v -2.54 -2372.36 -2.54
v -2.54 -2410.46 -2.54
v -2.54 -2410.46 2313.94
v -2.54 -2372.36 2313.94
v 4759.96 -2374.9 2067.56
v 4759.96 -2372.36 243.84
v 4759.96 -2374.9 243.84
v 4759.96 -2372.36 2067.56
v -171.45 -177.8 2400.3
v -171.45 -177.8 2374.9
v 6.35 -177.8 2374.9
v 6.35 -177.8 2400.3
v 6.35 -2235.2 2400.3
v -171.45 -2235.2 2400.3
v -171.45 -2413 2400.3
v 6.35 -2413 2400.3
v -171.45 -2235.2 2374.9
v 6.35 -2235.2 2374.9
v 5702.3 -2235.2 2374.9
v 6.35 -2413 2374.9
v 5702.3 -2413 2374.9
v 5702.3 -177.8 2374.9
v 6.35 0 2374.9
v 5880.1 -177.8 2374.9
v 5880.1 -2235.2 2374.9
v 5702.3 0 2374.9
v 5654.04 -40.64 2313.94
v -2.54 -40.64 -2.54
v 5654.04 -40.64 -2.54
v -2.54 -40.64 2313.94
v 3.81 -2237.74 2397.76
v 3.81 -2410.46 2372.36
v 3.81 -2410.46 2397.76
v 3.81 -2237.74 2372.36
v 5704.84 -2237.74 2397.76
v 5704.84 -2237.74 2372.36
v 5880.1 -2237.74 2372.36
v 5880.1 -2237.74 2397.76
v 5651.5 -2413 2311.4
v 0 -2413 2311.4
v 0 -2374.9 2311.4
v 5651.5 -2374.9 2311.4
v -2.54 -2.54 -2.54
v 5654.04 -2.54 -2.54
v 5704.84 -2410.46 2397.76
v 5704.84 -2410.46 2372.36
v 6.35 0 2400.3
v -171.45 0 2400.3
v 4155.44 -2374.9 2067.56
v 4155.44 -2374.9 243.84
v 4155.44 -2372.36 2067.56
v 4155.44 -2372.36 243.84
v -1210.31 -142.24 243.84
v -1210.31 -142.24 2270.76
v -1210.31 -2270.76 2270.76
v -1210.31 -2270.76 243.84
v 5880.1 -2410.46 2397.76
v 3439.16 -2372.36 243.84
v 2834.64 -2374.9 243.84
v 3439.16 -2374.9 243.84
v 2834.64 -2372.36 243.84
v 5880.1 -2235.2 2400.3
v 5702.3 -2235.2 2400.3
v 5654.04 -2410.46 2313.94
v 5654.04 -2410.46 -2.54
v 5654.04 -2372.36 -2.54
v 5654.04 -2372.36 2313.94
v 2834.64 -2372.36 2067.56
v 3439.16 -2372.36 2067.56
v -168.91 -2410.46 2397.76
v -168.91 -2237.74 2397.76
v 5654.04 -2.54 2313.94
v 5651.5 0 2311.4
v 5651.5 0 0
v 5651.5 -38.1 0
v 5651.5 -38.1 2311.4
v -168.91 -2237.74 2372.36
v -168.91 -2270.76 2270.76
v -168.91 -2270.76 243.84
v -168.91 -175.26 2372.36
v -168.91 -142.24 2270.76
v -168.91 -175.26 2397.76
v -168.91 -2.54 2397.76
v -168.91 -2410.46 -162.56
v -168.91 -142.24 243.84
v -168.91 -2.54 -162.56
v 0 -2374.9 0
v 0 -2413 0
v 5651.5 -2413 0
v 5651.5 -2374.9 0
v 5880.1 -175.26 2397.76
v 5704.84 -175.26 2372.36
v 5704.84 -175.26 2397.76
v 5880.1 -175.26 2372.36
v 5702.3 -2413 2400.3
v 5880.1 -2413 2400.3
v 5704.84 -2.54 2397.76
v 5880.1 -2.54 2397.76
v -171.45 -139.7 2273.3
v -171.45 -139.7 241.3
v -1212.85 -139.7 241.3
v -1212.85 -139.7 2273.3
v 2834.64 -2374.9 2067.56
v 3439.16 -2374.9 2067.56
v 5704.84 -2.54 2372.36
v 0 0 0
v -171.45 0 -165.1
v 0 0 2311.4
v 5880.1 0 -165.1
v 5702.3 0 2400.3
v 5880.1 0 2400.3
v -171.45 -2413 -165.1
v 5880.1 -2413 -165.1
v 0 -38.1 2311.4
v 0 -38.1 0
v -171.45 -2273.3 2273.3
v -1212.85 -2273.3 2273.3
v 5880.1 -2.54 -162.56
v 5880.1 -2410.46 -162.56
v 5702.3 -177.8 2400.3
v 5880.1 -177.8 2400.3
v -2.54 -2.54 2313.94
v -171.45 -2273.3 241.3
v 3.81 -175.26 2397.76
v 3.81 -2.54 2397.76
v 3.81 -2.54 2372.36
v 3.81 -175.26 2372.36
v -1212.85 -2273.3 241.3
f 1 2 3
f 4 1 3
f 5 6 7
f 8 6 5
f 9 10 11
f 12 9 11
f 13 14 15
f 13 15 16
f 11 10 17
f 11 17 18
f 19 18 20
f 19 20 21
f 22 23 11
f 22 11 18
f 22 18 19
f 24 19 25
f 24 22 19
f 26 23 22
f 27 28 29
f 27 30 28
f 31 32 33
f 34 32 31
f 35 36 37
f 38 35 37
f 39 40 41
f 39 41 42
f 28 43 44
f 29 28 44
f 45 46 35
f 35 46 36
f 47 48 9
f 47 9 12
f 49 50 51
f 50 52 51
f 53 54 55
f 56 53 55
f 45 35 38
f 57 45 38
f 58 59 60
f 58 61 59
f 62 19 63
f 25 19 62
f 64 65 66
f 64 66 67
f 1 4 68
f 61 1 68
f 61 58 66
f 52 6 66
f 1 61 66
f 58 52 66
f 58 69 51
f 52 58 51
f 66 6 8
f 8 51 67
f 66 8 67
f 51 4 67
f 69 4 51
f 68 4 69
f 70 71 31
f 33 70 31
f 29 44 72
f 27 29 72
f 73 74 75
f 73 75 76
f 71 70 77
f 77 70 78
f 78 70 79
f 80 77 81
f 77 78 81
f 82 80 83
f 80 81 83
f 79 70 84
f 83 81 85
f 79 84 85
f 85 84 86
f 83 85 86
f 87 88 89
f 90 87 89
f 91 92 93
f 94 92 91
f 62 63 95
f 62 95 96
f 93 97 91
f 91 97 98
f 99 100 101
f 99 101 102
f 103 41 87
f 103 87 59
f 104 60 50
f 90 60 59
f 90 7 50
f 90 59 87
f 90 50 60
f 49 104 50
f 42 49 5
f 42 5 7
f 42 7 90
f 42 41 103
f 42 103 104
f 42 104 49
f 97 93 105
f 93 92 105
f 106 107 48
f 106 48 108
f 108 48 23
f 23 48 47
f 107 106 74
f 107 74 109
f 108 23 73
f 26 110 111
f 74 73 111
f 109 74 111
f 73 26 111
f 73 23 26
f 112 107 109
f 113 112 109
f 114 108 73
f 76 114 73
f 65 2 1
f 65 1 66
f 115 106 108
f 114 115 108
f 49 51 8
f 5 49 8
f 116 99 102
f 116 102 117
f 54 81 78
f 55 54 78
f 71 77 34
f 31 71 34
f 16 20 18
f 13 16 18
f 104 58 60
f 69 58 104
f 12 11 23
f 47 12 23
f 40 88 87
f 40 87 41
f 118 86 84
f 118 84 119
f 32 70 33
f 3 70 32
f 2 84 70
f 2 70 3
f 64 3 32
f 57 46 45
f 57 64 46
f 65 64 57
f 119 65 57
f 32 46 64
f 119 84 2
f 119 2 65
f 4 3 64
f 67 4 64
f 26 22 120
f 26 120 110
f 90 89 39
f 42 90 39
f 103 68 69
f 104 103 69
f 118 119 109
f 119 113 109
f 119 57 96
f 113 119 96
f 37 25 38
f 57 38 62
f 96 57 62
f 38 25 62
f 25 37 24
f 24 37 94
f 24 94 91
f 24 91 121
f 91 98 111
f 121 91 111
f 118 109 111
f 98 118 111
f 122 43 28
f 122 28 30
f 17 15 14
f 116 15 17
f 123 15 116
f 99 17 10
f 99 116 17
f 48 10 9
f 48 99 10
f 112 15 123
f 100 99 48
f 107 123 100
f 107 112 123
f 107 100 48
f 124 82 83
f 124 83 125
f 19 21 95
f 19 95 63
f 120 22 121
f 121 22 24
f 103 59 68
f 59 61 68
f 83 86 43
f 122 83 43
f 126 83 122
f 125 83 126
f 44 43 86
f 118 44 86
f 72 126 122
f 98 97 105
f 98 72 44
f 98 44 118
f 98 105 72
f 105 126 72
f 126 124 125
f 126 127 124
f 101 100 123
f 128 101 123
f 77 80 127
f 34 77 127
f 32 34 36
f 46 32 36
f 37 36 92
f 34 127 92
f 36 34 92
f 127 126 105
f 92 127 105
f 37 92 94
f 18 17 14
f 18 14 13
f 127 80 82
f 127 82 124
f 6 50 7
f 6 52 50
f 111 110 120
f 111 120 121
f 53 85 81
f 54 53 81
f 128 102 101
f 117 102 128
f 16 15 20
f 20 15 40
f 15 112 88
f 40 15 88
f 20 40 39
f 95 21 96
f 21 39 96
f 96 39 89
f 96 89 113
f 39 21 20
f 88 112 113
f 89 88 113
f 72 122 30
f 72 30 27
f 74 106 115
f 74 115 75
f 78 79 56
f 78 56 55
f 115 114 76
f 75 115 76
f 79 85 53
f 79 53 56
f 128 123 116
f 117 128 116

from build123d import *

# Parameters (mm, degrees)
F0_W      = 6051.55
F0_H      = 2540
F1_DEPTH  = 2413
F2_W      = 5651.5
F2_H      = 2311.4
F3_DEPTH  = 38.1
F4_W      = 5651.5
F4_H      = 2311.4
F5_DEPTH  = 38.1
F6_W      = 609.6
F6_H      = 1828.8
F7_DEPTH  = 25.4
F8_W      = 2133.6
F8_H      = 2032
F9_DEPTH  = 1041.4
F10_W     = 177.8
F10_H     = 177.8
F11_DEPTH = 25.4
F13_T     = -2.54
F14_DEPTH = 25.4
F15_DEPTH = 25.4


with BuildPart() as f1:
    # F0 (on Front) → F1 (new body)
    with BuildSketch(Plane.XZ):
        with Locations((2854.325, 1104.9)):
            Rectangle(F0_W, F0_H)
    extrude(amount=F1_DEPTH)

    # F2 (on face) → F3 (cut)
    with BuildSketch(Plane.XZ.offset(2413)):
        with Locations((2825.75, 1155.7)):
            Rectangle(F2_W, F2_H)
    extrude(amount=-F3_DEPTH, mode=Mode.SUBTRACT)

    # F4 (on face) → F5 (cut)
    with BuildSketch(Plane.XZ):
        with Locations((2825.75, 1155.7)):
            Rectangle(F4_W, F4_H)
    extrude(amount=F5_DEPTH, mode=Mode.SUBTRACT)

    # F6 (on face) → F7 (join)
    with BuildSketch(Plane.XZ.offset(2374.9)):
        with Locations((3136.9, 1155.7)):
            Rectangle(F6_W, F6_H)
        with Locations((4457.7, 1155.7)):
            Rectangle(F6_W, F6_H)
    extrude(amount=F7_DEPTH)

    # F8 (on face) → F9 (join)
    with BuildSketch(Plane(origin=(-171.45, 0, 0), x_dir=(0, -1, 0), z_dir=(-1, 0, 0))):
        with Locations((1206.5, 1257.3)):
            Rectangle(F8_W, F8_H)
    extrude(amount=F9_DEPTH)

    # F10 (on face) → F11 (join)
    with BuildSketch(Plane.XY.offset(2374.9)):
        with Locations((-82.55, -2324.1)):
            Rectangle(F10_W, F10_H)
        with Locations((-82.55, -88.9)):
            Rectangle(F10_W, F10_H)
        with Locations((5791.2, -88.9)):
            Rectangle(F10_W, F10_H)
        with Locations((5791.2, -2324.1)):
            Rectangle(F10_W, F10_H)
    extrude(amount=F11_DEPTH)

    # F13
    f13_openings = [f1.faces().sort_by_distance(p)[0] for p in [
        (5880.1, -1206.5, 1106.787513),
    ]]
    offset(amount=F13_T, openings=f13_openings, kind=Kind.INTERSECTION)

    # F14 (cut): a face of the model
    f14_faces = [f1.faces().sort_by_distance(p)[0] for p in [
        (3136.9, -2400.3, 1155.7),
    ]]
    extrude(f14_faces, amount=-F14_DEPTH, mode=Mode.SUBTRACT)

    # F15 (cut): a face of the model
    f15_faces = [f1.faces().sort_by_distance(p)[0] for p in [
        (4457.7, -2400.3, 1155.7),
    ]]
    extrude(f15_faces, amount=-F15_DEPTH, mode=Mode.SUBTRACT)


solid = f1.part
